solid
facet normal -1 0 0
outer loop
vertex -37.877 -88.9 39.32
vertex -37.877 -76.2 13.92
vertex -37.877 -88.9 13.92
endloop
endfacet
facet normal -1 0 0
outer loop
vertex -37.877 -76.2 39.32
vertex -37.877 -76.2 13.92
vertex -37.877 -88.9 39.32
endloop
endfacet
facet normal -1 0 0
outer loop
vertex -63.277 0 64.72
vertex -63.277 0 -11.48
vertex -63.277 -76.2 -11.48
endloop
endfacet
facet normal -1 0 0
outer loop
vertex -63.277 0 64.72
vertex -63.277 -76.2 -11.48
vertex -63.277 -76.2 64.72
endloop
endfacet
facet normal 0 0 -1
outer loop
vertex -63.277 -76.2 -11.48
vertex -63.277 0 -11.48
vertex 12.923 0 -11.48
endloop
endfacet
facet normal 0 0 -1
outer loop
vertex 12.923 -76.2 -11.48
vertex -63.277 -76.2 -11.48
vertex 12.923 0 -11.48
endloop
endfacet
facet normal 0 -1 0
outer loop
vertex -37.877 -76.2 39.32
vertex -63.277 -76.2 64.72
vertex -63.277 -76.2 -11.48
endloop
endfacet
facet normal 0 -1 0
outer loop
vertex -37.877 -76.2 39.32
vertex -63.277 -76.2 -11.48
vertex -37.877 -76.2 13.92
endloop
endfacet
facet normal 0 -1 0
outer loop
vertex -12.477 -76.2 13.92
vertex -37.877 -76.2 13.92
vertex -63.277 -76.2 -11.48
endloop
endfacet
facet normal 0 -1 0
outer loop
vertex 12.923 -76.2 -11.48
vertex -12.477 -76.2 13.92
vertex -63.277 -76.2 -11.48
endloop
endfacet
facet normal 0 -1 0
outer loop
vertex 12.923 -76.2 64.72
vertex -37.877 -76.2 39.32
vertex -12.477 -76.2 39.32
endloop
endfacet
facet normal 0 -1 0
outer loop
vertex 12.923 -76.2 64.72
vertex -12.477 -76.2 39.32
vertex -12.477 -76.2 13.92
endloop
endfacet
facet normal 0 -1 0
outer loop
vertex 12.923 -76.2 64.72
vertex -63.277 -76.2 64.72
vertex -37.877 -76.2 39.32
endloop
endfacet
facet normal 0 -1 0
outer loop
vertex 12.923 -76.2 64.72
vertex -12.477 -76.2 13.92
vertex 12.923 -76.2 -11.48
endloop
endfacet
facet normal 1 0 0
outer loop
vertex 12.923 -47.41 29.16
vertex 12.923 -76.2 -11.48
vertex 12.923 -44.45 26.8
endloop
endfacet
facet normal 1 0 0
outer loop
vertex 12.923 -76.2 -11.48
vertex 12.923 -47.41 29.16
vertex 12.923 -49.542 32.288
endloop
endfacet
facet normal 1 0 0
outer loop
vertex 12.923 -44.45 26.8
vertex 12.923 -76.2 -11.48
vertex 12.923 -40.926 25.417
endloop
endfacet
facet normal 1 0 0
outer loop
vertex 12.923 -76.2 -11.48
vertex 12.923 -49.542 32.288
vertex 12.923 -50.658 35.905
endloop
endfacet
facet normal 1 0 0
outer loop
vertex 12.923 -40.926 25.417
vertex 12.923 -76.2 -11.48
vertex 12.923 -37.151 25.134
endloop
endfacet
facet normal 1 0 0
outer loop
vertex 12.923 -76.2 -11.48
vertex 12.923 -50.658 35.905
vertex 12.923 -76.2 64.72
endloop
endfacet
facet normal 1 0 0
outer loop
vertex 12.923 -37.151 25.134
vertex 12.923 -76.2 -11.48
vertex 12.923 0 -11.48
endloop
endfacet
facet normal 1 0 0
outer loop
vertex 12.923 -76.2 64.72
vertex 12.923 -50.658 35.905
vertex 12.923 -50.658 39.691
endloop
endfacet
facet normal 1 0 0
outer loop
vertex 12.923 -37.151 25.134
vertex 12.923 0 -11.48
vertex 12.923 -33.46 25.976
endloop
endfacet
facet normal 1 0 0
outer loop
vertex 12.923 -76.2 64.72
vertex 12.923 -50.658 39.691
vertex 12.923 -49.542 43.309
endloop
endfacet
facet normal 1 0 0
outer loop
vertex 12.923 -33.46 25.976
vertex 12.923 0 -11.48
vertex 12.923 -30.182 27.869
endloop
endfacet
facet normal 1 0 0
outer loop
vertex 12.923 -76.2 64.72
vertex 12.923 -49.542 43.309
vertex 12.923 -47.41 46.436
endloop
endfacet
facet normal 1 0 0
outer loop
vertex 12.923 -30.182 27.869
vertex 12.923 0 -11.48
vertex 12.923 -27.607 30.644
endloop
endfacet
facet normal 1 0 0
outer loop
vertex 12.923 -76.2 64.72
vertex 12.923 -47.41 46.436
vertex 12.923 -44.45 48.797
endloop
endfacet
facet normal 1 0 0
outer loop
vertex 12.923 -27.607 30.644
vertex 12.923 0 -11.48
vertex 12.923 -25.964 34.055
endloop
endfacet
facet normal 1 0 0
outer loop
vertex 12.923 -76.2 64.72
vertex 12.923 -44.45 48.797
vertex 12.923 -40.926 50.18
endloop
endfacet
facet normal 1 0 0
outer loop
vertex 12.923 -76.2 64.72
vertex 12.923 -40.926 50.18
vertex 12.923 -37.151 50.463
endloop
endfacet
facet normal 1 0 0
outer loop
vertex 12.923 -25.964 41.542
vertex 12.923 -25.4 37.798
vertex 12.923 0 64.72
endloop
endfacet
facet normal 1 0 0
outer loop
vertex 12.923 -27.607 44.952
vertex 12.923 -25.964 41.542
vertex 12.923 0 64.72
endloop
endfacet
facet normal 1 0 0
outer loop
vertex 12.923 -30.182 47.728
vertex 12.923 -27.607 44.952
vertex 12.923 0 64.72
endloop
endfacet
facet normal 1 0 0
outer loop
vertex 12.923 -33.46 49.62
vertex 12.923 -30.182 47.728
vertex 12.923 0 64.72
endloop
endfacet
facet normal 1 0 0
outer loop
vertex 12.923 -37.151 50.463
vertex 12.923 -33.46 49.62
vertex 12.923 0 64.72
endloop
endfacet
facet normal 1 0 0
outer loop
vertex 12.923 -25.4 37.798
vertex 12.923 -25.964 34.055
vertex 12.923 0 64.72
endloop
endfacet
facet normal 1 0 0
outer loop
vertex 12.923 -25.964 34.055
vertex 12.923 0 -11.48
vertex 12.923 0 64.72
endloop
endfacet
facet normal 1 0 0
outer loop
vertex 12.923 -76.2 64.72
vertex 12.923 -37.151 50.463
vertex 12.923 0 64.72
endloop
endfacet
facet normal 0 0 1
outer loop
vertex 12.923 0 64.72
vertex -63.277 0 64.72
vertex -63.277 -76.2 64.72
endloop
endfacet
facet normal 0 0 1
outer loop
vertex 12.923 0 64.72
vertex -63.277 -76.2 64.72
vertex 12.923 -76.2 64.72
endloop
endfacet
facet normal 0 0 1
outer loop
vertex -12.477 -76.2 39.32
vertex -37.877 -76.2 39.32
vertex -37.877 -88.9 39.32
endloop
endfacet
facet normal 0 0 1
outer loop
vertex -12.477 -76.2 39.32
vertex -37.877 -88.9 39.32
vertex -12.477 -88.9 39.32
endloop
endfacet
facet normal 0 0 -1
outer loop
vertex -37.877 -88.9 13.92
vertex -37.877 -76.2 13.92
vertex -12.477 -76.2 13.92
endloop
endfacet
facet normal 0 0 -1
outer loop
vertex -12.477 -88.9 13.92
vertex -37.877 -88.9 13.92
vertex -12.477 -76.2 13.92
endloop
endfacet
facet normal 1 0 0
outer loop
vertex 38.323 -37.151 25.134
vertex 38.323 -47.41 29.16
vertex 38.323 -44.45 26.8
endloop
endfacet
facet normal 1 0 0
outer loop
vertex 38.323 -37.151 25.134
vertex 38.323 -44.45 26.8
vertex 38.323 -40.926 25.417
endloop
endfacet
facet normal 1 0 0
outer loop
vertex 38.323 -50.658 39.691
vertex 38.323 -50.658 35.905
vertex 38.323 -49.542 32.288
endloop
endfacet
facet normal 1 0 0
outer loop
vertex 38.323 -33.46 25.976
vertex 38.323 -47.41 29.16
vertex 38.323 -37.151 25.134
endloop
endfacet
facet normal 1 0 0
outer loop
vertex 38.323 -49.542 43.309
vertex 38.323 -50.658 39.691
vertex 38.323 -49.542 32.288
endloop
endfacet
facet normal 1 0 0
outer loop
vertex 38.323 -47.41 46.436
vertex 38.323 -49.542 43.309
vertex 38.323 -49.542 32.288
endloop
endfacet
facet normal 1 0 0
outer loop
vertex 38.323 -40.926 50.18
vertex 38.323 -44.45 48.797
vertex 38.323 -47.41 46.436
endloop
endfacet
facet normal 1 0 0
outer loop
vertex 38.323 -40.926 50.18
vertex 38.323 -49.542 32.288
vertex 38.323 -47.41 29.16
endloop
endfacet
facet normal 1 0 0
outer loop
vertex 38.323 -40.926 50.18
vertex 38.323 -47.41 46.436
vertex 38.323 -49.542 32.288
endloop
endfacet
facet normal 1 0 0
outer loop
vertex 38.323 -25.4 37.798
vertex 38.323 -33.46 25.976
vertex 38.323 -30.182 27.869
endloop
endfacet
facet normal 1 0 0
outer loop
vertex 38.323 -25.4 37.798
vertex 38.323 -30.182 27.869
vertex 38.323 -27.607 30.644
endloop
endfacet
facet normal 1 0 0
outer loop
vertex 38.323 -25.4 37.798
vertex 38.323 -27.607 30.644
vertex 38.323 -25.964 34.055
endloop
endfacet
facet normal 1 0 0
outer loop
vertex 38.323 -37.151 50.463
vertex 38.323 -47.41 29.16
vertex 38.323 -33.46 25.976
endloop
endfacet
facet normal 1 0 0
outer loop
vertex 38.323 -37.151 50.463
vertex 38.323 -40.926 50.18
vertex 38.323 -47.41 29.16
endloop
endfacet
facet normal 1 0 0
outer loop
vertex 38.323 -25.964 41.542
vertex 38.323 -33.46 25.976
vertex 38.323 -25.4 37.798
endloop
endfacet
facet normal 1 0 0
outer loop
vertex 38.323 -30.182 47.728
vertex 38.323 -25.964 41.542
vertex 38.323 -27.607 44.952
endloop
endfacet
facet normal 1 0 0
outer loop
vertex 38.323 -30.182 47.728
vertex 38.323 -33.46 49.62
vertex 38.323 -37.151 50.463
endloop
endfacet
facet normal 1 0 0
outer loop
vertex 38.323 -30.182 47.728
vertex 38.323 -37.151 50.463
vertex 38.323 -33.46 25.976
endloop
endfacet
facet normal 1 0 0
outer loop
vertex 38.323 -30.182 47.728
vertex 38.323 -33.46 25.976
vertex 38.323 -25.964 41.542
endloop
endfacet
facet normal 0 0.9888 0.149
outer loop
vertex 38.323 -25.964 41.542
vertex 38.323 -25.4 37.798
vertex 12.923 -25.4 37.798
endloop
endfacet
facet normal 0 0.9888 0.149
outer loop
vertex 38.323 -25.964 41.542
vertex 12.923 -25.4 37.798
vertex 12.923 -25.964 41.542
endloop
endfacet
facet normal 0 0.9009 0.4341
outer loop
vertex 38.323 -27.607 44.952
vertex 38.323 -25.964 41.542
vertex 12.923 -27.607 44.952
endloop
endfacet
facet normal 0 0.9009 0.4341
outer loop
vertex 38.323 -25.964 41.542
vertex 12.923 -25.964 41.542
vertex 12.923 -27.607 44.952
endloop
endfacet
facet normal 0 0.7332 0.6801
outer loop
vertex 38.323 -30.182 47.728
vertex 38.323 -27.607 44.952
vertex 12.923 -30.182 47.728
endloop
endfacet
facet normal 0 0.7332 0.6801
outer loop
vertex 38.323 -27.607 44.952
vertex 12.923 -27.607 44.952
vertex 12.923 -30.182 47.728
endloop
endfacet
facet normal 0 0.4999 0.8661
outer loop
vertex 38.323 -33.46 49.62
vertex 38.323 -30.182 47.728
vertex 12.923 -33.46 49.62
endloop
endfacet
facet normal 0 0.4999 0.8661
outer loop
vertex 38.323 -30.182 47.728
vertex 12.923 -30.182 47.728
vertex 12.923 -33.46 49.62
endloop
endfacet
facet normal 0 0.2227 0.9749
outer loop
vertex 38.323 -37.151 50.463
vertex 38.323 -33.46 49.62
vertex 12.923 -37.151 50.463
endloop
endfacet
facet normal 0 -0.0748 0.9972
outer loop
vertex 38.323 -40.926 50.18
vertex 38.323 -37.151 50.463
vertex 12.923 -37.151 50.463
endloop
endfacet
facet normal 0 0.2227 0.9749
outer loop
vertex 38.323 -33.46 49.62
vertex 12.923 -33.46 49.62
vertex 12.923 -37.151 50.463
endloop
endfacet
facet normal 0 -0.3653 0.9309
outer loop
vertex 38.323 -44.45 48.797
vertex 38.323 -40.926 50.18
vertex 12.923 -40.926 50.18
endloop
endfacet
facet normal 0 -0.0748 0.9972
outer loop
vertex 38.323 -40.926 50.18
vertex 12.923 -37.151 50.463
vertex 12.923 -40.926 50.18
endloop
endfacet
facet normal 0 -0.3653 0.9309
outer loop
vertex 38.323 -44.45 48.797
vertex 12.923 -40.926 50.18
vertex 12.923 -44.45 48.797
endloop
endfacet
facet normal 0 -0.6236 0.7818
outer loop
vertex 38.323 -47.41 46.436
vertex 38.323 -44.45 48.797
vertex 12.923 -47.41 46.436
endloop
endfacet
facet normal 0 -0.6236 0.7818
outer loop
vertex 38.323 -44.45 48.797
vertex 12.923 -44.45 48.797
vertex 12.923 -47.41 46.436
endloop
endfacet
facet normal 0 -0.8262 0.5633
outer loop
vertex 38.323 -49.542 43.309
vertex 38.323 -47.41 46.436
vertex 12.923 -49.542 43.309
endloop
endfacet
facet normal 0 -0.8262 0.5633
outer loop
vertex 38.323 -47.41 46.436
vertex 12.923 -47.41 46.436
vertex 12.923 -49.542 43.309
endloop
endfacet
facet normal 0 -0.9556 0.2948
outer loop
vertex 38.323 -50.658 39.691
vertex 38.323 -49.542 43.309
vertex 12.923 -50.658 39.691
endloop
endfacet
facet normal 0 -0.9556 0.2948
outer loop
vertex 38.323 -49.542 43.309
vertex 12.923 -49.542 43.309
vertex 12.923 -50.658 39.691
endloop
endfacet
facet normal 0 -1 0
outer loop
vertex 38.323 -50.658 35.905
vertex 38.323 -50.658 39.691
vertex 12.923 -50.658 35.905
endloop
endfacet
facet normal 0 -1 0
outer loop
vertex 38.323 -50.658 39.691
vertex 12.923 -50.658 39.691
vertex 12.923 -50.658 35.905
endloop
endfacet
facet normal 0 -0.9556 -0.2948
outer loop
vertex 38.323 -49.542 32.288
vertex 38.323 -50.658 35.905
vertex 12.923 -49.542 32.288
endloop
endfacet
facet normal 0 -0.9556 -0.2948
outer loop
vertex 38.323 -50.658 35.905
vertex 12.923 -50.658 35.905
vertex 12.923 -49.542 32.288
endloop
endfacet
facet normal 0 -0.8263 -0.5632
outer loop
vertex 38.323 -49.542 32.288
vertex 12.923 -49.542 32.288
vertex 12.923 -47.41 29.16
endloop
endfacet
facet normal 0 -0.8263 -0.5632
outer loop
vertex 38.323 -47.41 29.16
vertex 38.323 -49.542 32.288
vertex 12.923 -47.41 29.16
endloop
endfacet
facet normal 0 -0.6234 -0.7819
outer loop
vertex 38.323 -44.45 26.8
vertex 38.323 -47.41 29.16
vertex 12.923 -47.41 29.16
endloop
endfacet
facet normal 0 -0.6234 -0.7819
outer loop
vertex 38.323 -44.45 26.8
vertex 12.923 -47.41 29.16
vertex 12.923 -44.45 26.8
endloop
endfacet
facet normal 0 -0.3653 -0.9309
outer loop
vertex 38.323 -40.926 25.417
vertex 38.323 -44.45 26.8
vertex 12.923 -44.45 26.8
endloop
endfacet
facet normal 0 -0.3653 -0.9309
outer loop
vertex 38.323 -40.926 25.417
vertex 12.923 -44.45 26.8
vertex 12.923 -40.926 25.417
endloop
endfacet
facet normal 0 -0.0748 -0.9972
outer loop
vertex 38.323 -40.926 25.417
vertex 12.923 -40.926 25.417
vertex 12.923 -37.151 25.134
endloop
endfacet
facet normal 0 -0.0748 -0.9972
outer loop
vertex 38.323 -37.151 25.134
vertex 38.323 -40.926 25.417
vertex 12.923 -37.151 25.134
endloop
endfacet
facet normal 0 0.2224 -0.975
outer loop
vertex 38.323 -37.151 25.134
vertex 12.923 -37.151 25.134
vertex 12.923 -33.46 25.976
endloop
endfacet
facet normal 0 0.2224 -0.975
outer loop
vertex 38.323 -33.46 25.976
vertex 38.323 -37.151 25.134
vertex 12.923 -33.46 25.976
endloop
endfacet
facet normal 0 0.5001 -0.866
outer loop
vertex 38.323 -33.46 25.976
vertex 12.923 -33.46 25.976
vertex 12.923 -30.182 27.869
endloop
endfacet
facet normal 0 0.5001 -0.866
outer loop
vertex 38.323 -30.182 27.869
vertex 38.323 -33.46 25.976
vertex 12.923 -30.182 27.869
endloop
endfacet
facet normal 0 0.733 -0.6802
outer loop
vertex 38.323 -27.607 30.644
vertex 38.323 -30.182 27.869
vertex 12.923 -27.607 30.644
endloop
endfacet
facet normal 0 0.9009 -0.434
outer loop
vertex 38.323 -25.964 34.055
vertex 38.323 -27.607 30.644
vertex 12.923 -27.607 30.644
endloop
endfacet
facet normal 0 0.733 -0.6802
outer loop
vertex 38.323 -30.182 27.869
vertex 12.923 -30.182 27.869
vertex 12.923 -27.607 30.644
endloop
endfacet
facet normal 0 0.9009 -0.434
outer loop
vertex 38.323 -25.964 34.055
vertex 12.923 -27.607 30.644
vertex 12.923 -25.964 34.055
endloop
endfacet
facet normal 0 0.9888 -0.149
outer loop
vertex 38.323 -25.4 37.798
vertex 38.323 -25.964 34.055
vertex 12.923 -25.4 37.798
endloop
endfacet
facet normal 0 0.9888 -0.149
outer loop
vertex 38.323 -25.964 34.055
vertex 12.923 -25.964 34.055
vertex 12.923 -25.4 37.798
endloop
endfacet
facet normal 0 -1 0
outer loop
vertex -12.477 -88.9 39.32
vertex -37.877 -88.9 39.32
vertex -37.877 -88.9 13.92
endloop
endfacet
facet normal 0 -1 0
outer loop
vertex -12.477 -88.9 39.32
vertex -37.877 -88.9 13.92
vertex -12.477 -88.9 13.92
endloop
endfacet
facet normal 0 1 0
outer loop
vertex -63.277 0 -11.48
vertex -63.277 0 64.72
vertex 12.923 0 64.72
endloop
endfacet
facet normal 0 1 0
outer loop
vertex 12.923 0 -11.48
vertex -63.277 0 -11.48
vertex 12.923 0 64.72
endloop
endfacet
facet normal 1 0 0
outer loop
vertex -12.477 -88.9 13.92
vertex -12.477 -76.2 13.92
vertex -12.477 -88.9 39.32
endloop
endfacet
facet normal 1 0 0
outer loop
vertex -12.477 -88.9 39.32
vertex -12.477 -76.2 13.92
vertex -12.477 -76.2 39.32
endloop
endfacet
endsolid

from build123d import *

# Parameters (mm, degrees)
F0_W     = 76.2
F0_H     = 76.2
F1_DEPTH = 76.2
F2_W     = 25.4
F2_H     = 25.4
F3_DEPTH = 12.7
F4_R     = 12.7
F5_DEPTH = 25.4
F6_DEPTH = 25.4


with BuildPart() as f1:
    # F0 (on Front) → F1 (new body)
    with BuildSketch(Plane.XZ):
        with Locations((-25.176713, 26.619935)):
            Rectangle(F0_W, F0_H)
    extrude(amount=F1_DEPTH)

    # F2 (on face) → F3 (join)
    with BuildSketch(Plane.XZ.offset(76.2)):
        with Locations((-25.176713, 26.619935)):
            Rectangle(F2_W, F2_H)
    extrude(amount=F3_DEPTH)

    # F4 (on face) → F5 (join)
    with BuildSketch(Plane.YZ.offset(12.923287)):
        with Locations((-38.1, 37.798271)):
            Circle(F4_R)
    extrude(amount=F5_DEPTH)

    # F4 (on face) → F6 (join)
    with BuildSketch(Plane.YZ.offset(12.923287)):
        with Locations((-38.1, 37.798271)):
            Circle(F4_R)
    extrude(amount=F6_DEPTH)


solid = f1.part
